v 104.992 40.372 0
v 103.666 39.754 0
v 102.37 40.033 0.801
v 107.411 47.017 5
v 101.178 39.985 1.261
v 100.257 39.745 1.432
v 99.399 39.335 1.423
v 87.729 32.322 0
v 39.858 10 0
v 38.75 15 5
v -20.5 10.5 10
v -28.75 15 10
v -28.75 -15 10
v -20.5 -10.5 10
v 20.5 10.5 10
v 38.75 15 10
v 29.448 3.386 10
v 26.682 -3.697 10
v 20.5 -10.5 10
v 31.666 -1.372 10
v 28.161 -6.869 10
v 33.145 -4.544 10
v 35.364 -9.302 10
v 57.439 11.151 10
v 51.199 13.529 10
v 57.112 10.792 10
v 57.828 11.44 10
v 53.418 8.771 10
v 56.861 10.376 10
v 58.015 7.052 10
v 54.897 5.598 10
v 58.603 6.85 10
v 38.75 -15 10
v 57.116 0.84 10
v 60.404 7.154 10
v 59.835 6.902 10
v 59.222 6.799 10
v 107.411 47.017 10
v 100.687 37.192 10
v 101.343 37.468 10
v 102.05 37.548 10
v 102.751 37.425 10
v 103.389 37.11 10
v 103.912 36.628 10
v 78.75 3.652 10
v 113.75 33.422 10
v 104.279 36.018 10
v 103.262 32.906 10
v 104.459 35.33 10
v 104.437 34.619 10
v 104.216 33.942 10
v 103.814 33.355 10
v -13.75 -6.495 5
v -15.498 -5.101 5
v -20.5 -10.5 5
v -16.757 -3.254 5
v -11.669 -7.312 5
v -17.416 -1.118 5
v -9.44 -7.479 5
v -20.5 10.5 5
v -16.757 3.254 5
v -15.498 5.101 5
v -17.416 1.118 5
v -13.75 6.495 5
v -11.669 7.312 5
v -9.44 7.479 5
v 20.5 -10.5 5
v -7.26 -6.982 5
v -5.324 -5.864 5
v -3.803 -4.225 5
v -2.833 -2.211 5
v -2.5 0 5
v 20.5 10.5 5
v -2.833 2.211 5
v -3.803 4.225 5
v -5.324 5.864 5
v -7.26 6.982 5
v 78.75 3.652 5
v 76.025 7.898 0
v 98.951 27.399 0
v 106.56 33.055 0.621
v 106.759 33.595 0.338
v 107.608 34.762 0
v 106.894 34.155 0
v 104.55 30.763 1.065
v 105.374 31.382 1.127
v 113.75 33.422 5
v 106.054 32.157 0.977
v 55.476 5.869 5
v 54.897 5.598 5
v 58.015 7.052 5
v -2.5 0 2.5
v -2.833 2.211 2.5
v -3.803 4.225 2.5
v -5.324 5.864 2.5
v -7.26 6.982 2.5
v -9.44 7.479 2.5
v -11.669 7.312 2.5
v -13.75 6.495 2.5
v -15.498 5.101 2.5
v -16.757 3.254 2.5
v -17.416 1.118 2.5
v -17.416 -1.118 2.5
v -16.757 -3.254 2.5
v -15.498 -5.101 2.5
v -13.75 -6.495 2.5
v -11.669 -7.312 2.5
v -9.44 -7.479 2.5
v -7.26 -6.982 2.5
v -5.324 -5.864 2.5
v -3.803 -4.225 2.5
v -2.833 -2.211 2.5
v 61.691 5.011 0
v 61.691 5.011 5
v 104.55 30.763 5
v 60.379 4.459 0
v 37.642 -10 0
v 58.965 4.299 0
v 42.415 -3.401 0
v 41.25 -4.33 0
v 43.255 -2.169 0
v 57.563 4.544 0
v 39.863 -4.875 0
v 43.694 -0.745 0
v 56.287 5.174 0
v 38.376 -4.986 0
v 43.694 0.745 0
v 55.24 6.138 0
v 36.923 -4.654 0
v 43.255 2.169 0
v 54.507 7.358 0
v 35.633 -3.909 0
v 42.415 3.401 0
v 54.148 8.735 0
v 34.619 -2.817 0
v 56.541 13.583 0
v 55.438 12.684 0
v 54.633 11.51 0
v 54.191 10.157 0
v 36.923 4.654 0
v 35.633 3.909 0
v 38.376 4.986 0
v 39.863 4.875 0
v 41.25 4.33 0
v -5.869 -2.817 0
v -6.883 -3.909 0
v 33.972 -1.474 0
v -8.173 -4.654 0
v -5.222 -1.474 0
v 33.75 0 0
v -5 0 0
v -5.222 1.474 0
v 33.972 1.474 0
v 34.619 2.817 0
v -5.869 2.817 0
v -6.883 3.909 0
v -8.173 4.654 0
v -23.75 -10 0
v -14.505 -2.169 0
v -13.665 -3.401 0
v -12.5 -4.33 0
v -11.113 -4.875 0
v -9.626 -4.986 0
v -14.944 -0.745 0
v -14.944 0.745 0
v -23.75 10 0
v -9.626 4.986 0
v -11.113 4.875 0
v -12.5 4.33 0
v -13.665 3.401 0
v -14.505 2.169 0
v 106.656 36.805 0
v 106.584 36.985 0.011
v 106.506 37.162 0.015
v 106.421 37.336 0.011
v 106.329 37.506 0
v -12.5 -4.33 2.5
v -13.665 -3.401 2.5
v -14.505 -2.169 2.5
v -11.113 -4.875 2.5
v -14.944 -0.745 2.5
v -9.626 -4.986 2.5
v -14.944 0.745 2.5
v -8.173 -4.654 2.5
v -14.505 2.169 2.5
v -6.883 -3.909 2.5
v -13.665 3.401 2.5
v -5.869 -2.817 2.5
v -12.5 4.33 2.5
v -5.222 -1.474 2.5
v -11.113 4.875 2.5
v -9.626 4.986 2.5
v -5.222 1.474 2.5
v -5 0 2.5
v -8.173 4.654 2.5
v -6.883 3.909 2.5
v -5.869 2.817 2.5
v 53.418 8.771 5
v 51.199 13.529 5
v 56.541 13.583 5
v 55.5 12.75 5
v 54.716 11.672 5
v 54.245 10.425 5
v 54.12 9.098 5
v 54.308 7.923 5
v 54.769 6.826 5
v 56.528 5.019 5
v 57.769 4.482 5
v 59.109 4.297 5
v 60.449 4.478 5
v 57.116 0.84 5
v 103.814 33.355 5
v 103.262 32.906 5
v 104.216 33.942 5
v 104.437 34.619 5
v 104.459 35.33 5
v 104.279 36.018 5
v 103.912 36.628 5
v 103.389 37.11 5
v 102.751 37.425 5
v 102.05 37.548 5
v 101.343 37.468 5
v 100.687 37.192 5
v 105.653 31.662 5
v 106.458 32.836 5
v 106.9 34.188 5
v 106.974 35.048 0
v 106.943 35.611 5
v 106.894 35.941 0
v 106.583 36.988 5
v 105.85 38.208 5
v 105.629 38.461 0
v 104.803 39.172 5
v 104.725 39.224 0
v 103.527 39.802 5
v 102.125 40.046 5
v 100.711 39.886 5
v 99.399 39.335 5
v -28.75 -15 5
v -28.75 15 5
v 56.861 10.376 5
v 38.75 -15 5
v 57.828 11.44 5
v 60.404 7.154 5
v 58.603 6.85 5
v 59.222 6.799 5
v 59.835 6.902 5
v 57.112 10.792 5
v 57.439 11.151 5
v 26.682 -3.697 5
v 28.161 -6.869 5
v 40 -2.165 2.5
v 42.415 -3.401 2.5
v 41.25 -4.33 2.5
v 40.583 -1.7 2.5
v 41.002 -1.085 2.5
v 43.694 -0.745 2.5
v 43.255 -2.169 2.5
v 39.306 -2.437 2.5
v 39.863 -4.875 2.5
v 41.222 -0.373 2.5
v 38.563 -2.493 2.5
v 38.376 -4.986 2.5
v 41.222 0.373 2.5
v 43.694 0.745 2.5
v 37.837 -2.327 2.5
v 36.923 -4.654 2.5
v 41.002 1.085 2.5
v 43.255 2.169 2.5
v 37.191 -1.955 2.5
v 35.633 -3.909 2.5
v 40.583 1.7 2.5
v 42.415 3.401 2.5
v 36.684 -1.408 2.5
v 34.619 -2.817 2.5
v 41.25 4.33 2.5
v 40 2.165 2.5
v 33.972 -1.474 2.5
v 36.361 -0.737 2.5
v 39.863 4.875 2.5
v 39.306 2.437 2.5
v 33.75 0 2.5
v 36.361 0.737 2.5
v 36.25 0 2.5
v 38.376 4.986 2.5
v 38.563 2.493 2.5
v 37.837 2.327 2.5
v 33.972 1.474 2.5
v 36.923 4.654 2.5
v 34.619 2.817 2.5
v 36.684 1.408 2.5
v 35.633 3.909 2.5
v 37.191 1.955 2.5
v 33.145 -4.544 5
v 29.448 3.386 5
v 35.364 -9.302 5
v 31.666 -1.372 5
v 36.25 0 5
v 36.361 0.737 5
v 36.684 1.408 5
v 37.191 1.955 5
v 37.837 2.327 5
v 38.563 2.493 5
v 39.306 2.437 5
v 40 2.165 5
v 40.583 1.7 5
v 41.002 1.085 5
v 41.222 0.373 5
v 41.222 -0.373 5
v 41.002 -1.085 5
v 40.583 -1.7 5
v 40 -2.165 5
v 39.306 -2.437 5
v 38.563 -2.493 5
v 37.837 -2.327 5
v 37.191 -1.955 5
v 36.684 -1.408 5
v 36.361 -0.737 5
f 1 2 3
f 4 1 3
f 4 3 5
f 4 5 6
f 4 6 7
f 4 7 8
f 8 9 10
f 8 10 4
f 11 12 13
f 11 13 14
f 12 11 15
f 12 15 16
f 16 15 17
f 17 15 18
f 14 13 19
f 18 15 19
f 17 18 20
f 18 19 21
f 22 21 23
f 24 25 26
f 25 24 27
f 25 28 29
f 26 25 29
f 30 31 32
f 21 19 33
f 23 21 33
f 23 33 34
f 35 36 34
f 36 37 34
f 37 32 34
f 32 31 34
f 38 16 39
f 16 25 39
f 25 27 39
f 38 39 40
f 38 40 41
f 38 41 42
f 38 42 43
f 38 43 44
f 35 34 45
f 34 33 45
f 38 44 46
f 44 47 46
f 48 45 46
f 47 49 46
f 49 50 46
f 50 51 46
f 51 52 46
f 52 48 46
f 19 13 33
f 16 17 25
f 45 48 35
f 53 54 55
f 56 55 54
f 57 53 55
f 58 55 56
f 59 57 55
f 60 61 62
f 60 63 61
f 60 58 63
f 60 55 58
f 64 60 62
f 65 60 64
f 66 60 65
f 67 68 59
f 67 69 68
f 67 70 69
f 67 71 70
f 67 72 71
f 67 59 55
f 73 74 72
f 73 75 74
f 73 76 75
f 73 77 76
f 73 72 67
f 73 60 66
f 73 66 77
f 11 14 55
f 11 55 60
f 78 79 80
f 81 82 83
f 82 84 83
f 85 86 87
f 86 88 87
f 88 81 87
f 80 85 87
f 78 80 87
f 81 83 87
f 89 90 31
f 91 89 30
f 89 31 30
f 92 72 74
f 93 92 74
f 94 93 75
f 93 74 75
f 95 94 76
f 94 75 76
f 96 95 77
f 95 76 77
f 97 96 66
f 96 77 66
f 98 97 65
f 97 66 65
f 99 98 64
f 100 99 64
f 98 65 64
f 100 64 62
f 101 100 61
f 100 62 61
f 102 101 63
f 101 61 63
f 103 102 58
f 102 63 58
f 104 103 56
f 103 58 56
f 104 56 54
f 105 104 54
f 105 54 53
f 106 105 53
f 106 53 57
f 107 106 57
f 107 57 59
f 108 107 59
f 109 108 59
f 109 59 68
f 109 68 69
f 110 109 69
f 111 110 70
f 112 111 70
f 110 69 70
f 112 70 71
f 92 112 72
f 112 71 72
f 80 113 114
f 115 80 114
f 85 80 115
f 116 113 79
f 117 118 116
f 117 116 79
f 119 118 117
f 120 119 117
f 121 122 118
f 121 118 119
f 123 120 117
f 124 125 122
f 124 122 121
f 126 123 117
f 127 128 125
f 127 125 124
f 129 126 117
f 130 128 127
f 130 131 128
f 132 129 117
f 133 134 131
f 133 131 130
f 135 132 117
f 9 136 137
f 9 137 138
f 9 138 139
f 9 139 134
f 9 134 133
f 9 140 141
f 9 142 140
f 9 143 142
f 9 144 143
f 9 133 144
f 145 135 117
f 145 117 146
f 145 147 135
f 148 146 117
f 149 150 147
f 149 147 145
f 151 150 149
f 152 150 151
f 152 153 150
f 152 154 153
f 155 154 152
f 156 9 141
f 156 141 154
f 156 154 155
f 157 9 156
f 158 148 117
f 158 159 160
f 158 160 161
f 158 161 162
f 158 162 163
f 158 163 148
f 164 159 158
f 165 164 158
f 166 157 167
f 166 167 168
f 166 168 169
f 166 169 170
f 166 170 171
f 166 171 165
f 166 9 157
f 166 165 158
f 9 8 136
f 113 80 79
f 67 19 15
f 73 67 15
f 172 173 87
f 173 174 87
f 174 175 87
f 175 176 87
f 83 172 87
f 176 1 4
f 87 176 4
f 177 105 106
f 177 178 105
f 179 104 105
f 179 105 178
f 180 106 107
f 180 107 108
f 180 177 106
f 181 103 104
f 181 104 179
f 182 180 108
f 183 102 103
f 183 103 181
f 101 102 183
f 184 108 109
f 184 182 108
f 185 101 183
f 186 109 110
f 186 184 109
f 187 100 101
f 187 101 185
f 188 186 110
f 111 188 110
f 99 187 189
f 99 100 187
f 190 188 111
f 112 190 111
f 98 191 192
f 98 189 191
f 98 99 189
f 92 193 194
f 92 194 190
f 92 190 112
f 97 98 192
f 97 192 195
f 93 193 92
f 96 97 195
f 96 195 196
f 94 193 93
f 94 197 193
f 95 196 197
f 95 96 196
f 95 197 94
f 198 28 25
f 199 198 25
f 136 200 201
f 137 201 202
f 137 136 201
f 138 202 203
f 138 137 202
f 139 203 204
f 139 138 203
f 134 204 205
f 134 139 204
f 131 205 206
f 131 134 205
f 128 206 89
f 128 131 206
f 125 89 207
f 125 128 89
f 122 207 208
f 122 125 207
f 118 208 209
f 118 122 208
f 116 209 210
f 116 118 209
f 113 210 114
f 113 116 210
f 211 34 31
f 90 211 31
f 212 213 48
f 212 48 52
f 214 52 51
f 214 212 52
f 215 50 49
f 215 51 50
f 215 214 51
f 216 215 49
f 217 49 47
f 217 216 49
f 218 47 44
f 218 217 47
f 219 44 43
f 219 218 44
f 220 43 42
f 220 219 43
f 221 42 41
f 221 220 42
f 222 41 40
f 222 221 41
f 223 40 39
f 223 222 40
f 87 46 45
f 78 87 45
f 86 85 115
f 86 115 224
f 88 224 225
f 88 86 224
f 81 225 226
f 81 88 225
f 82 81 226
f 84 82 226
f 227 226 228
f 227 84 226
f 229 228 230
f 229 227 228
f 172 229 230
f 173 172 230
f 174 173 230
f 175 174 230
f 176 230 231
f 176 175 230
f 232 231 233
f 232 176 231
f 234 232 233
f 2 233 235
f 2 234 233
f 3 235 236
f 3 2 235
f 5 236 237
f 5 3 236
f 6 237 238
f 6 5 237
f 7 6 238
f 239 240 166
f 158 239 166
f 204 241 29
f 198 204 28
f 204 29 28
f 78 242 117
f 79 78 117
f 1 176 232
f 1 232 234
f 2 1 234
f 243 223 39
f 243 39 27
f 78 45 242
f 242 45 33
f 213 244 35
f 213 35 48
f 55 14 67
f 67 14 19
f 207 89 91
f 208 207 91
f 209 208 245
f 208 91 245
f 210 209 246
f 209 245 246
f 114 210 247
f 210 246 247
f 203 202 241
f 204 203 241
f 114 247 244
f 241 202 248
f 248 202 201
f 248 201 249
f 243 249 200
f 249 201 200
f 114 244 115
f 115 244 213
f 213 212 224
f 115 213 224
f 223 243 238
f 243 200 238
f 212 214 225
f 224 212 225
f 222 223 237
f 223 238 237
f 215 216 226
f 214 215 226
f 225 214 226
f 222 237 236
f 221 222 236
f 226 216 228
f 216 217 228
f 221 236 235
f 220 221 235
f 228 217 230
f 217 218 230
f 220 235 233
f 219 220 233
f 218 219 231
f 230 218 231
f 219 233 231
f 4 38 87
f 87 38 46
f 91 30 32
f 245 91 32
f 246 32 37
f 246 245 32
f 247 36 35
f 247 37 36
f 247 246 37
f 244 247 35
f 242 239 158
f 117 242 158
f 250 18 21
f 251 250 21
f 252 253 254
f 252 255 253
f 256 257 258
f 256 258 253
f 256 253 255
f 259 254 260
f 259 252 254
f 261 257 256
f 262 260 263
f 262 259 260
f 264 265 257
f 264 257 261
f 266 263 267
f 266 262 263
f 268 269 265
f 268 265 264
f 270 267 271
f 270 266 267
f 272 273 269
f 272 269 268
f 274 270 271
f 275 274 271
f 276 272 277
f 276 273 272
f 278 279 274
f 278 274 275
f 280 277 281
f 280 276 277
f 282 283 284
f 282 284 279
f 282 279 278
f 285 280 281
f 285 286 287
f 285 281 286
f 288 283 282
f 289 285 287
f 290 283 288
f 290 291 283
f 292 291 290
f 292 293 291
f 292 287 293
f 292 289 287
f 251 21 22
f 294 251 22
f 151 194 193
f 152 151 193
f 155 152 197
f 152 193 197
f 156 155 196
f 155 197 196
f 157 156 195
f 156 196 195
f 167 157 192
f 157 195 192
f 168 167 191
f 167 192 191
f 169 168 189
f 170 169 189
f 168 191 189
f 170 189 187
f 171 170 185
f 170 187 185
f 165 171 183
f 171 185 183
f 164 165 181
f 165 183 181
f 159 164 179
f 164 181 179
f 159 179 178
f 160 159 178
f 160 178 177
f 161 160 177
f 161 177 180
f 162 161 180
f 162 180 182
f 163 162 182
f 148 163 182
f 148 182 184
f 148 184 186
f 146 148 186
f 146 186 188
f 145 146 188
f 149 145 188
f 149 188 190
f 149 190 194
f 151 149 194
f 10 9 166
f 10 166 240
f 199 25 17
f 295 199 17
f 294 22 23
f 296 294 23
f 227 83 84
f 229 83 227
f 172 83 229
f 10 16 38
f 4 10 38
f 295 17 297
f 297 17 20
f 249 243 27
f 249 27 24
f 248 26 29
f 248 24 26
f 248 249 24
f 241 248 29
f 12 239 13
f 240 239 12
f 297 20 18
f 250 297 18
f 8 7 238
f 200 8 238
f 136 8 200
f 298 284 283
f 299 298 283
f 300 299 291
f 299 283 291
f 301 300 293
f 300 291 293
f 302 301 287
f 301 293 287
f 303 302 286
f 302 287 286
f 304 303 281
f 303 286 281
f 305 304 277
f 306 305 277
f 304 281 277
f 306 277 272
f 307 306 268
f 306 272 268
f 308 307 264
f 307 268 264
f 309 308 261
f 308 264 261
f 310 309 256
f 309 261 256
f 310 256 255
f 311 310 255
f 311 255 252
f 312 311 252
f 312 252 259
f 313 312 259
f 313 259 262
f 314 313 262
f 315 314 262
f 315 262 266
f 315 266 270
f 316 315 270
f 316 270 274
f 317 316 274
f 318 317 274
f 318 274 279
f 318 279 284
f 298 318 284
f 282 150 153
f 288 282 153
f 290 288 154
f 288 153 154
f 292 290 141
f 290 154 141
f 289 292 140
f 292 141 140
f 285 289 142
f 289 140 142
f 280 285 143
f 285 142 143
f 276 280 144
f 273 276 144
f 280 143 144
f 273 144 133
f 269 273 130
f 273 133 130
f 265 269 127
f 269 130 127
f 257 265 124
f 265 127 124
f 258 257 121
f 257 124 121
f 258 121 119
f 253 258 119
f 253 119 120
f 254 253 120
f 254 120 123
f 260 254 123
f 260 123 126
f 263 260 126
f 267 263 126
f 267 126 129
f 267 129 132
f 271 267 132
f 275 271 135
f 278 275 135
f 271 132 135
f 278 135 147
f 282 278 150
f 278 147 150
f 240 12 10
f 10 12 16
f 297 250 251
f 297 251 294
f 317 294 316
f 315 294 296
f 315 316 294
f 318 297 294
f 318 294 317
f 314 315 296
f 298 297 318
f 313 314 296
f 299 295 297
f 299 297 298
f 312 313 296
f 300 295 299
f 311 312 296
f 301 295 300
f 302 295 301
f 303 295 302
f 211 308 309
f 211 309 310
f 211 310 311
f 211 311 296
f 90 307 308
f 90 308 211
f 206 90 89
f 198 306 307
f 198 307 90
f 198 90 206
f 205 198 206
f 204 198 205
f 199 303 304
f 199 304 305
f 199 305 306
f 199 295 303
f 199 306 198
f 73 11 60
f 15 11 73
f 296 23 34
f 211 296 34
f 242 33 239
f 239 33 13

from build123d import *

# Parameters (mm, degrees)
SKETCH1_W                = 57.5
SKETCH1_H                = 30
BOSS_EXTRUDE1_DEPTH      = 30
SKETCH2_W                = 41
SKETCH2_H                = 21
CUT_EXTRUDE1_DEPTH       = 25
SKETCH8_R                = 2
CUT_EXTRUDE6_DEPTH       = 10
SKETCH10_R               = 5
CUT_EXTRUDE8_DEPTH       = 10
BOSS_EXTRUDE4_DEPTH      = 30
SKETCH16_R               = 5
CUT_EXTRUDE10_DEPTH      = 30
CHAMFER5_SIZE            = 5
SKETCH20_R               = 7.5
CUT_EXTRUDE13_DEPTH      = 2.5
CUT_EXTRUDE16_DEPTH      = 122.918629513
CUT_EXTRUDE16_DEPTH_BACK = 122.918629513
SKETCH30_W               = 142.5
SKETCH30_H               = 20
CUT_EXTRUDE17_DEPTH      = 5
CUT_EXTRUDE19_DEPTH      = 124.489525441
CUT_EXTRUDE20_DEPTH      = 5
SKETCH35_R               = 2.5
CUT_EXTRUDE21_DEPTH      = 5
SKETCH36_R               = 5
CUT_EXTRUDE22_DEPTH      = 2.5


with BuildPart() as part:
    # Sketch1 → Boss-Extrude1 (new body)
    with BuildSketch(Plane.XY):
        Rectangle(SKETCH1_W, SKETCH1_H)
    extrude(amount=BOSS_EXTRUDE1_DEPTH)

    # Sketch2 → Cut-Extrude1 (cut)
    with BuildSketch(Plane.XY.offset(30)):
        Rectangle(SKETCH2_W, SKETCH2_H)
    extrude(amount=-CUT_EXTRUDE1_DEPTH, mode=Mode.SUBTRACT)

    # Sketch8 → Cut-Extrude6 (cut)
    with BuildSketch(Plane.XY.offset(30)):
        with Locations((24.35, 6)):
            Circle(SKETCH8_R)
        with Locations(Location((24.35, -6, 0), (0, 0, 180))):
            Circle(SKETCH8_R)
        with Locations((-24.35, -6)):
            Circle(SKETCH8_R)
        with Locations(Location((-24.35, 6, 0), (0, 0, 180))):
            Circle(SKETCH8_R)
    extrude(amount=-CUT_EXTRUDE6_DEPTH, mode=Mode.SUBTRACT)

    # Sketch10 → Cut-Extrude8 (cut)
    with BuildSketch(Plane.XY.offset(5)):
        with Locations((-10, 0)):
            Circle(SKETCH10_R)
    extrude(amount=-CUT_EXTRUDE8_DEPTH, mode=Mode.SUBTRACT)

    # Sketch13 → Boss-Extrude4 (add)
    with BuildSketch(Plane.XY.offset(30)):
        Polygon((28.75, 15), (38.75, 15), (107.410726074, 47.017022383), (113.75, 33.422405577), (78.75, 3.652306326), (38.75, -15), (28.75, -15), align=None)
    extrude(amount=-BOSS_EXTRUDE4_DEPTH)

    # Sketch16 → Cut-Extrude10 (cut)
    with BuildSketch(Plane(origin=(1.175656739, -2.521204013, 0), x_dir=(0.9063077870366488, 0.42261826174070183, 0), z_dir=(-0.42261826174070183, 0.9063077870366488, 0))):
        with Locations(Location((97.217429724, -15, 0), (0, 0, 180))):
            Circle(SKETCH16_R)
        with BuildLine():
            Line((67.217429724, -12.5), (82.217429724, -12.5))
            ThreePointArc((82.217429724, -12.5), (84.717429724, -15), (82.217429724, -17.5))
            Line((82.217429724, -17.5), (67.217429724, -17.5))
            ThreePointArc((67.217429724, -17.5), (64.717429724, -15), (67.217429724, -12.5))
        make_face()
    extrude(amount=-CUT_EXTRUDE10_DEPTH, mode=Mode.SUBTRACT)

    # Chamfer5
    # the kernel refuses this chamfer: 5 mm, written as the material it takes off along each edge
    with BuildSketch(Plane(origin=(-28.75, 27.85841494, 0), x_dir=(-0.027495876610586317, 0, 0.9996219169112968), z_dir=(0, -1, 0))) as chamfer5_piece_1:
        Polygon((CHAMFER5_SIZE * 0.999621916911, -CHAMFER5_SIZE * 0.0274958766106), (-CHAMFER5_SIZE * 0.0274958766106, -CHAMFER5_SIZE * 0.999621916911), (0, 0), align=None)
    extrude(amount=55.71682988, mode=Mode.SUBTRACT)
    with BuildSketch(Plane(origin=(-41.60841494, -15, 0), x_dir=(0, -0.027495876610586317, 0.9996219169112968), z_dir=(1, 0, 0)), Plane(origin=(51.60841494, -15, 30), x_dir=(0, -0.027495876610586317, -0.9996219169112968), z_dir=(-1, 0, 0))) as chamfer5_piece_2:
        Polygon((CHAMFER5_SIZE * 0.999621916911, -CHAMFER5_SIZE * 0.0274958766106), (-CHAMFER5_SIZE * 0.0274958766106, -CHAMFER5_SIZE * 0.999621916911), (0, 0), align=None)
    extrude(amount=93.21682988, mode=Mode.SUBTRACT)
    with BuildSketch(Plane(origin=(90.403681589, 9.086507297, 30), x_dir=(-0.4224584769229526, 0.905965127389214, 0.02749587661058631), z_dir=(-0.9063077870366526, -0.4226182617406939, 0)), Plane(origin=(90.403681589, 9.086507297, 0), x_dir=(0.011620259578202724, -0.024919727083573626, 0.9996219169112968), z_dir=(-0.9063077870366526, -0.4226182617406939, 0))) as chamfer5_piece_3:
        Polygon((CHAMFER5_SIZE * 0.999621916911, CHAMFER5_SIZE * 0.0274958766106), (-CHAMFER5_SIZE * 0.0274958766106, CHAMFER5_SIZE * 0.999621916911), (0, 0), align=None)
    extrude(amount=69.851946638, mode=Mode.SUBTRACT)
    with BuildSketch(Plane(origin=(123.544555766, 41.753402643, 0), x_dir=(-0.6476573741944397, 0.7614354223576539, -0.027495876610586414), z_dir=(-0.7617234170999287, -0.6479023351104763, 0))) as chamfer5_piece_4:
        Polygon((CHAMFER5_SIZE * 0.999621916911, -CHAMFER5_SIZE * 0.0274958766106), (-CHAMFER5_SIZE * 0.0274958766106, -CHAMFER5_SIZE * 0.999621916911), (0, 0), align=None)
    extrude(amount=71.665266299, mode=Mode.SUBTRACT)
    with BuildSketch(Plane(origin=(123.544555766, 41.753402643, 30), x_dir=(-0.6476573741944397, 0.7614354223576539, 0.02749587661058634), z_dir=(-0.7617234170999287, -0.6479023351104763, 0))) as chamfer5_piece_5:
        Polygon((CHAMFER5_SIZE * 0.999621916911, CHAMFER5_SIZE * 0.0274958766106), (-CHAMFER5_SIZE * 0.0274958766106, CHAMFER5_SIZE * 0.999621916911), (0, 0), align=None)
    extrude(amount=71.665266299, mode=Mode.SUBTRACT)
    with BuildSketch(Plane(origin=(101.976525103, 58.670703972, 30), x_dir=(-0.9059651273892108, -0.42245847692295924, 0.027495876610586337), z_dir=(0.42261826174070055, -0.9063077870366495, 0))) as chamfer5_piece_6:
        Polygon((CHAMFER5_SIZE * 0.999621916911, CHAMFER5_SIZE * 0.0274958766106), (-CHAMFER5_SIZE * 0.0274958766106, CHAMFER5_SIZE * 0.999621916911), (0, 0), align=None)
    extrude(amount=40.71682988, mode=Mode.SUBTRACT)
    with BuildSketch(Plane(origin=(101.976525103, 58.670703972, 0), x_dir=(-0.9059651273892108, -0.42245847692295924, -0.027495876610586344), z_dir=(0.42261826174070055, -0.9063077870366495, 0))) as chamfer5_piece_7:
        Polygon((CHAMFER5_SIZE * 0.999621916911, -CHAMFER5_SIZE * 0.0274958766106), (-CHAMFER5_SIZE * 0.0274958766106, -CHAMFER5_SIZE * 0.999621916911), (0, 0), align=None)
    extrude(amount=40.71682988, mode=Mode.SUBTRACT)
    with BuildSketch(Plane(origin=(27.096318411, 9.565799029, 30), x_dir=(0.4224584769229604, -0.9059651273892103, 0.027495876610586313), z_dir=(0.9063077870366489, 0.4226182617407018, 0))) as chamfer5_piece_8_section:
        Polygon((CHAMFER5_SIZE * 0.999621916911, CHAMFER5_SIZE * 0.0274958766106), (-CHAMFER5_SIZE * 0.0274958766106, CHAMFER5_SIZE * 0.999621916911), (0, 0), align=None)
    chamfer5_piece_8 = extrude(amount=101.47555893, mode=Mode.PRIVATE)
    chamfer5_piece_8 = split(chamfer5_piece_8, bisect_by=Plane(origin=(81.150743587, 15, 28.329639499), z_dir=(0, 1, 0)), keep=Keep.TOP, mode=Mode.PRIVATE)
    add(chamfer5_piece_8, mode=Mode.SUBTRACT)
    with BuildSketch(Plane(origin=(27.096318411, 9.565799029, 0), x_dir=(0.4224584769229604, -0.9059651273892103, -0.02749587661058636), z_dir=(0.9063077870366489, 0.4226182617407018, 0))) as chamfer5_piece_9_section:
        Polygon((CHAMFER5_SIZE * 0.999621916911, -CHAMFER5_SIZE * 0.0274958766106), (-CHAMFER5_SIZE * 0.0274958766106, -CHAMFER5_SIZE * 0.999621916911), (0, 0), align=None)
    chamfer5_piece_9 = extrude(amount=101.47555893, mode=Mode.PRIVATE)
    chamfer5_piece_9 = split(chamfer5_piece_9, bisect_by=Plane(origin=(81.150743587, 15, 1.670360501), z_dir=(0, 1, 0)), keep=Keep.TOP, mode=Mode.PRIVATE)
    add(chamfer5_piece_9, mode=Mode.SUBTRACT)
    with BuildSketch(Plane(origin=(-41.60841494, 15, 0), x_dir=(0, -0.9996219169112968, -0.027495876610586372), z_dir=(1, 0, 0))) as chamfer5_piece_10_section:
        Polygon((CHAMFER5_SIZE * 0.999621916911, -CHAMFER5_SIZE * 0.0274958766106), (-CHAMFER5_SIZE * 0.0274958766106, -CHAMFER5_SIZE * 0.999621916911), (0, 0), align=None)
    chamfer5_piece_10 = extrude(amount=93.21682988, mode=Mode.PRIVATE)
    chamfer5_piece_10 = split(chamfer5_piece_10, bisect_by=Plane(origin=(3.719146846, -1.335155097, 1.672660276), z_dir=(-0.4226182617407018, 0.9063077870366489, 0)), keep=Keep.TOP, mode=Mode.PRIVATE)
    add(chamfer5_piece_10, mode=Mode.SUBTRACT)
    with BuildSketch(Plane(origin=(51.60841494, 15, 30), x_dir=(0, -0.9996219169112968, 0.027495876610586317), z_dir=(-1, 0, 0))) as chamfer5_piece_11_section:
        Polygon((CHAMFER5_SIZE * 0.999621916911, -CHAMFER5_SIZE * 0.0274958766106), (-CHAMFER5_SIZE * 0.0274958766106, -CHAMFER5_SIZE * 0.999621916911), (0, 0), align=None)
    chamfer5_piece_11 = extrude(amount=93.21682988, mode=Mode.PRIVATE)
    chamfer5_piece_11 = split(chamfer5_piece_11, bisect_by=Plane(origin=(3.719146846, -1.335155097, 28.327339724), z_dir=(-0.4226182617407018, 0.9063077870366489, 0)), keep=Keep.TOP, mode=Mode.PRIVATE)
    add(chamfer5_piece_11, mode=Mode.SUBTRACT)
    with BuildSketch(Plane(origin=(27.096318411, 9.565799029, 30), x_dir=(0.4224584769229604, -0.9059651273892103, 0.027495876610586313), z_dir=(0.9063077870366489, 0.4226182617407018, 0))) as chamfer5_piece_12a_section:
        Polygon((CHAMFER5_SIZE * 0.999621916911, CHAMFER5_SIZE * 0.0274958766106), (-CHAMFER5_SIZE * 0.0274958766106, CHAMFER5_SIZE * 0.999621916911), (0, 0), align=None)
    chamfer5_piece_12a = extrude(amount=101.47555893, mode=Mode.PRIVATE)
    chamfer5_piece_12a = split(chamfer5_piece_12a, bisect_by=Plane(origin=(35.512062488, 15, 28.462048788), z_dir=(0, -1, 0)), keep=Keep.TOP, mode=Mode.PRIVATE)
    with BuildSketch(Plane(origin=(51.60841494, 15, 30), x_dir=(0, -0.9996219169112968, 0.027495876610586317), z_dir=(-1, 0, 0))) as chamfer5_piece_12b_section:
        Polygon((CHAMFER5_SIZE * 0.999621916911, -CHAMFER5_SIZE * 0.0274958766106), (-CHAMFER5_SIZE * 0.0274958766106, -CHAMFER5_SIZE * 0.999621916911), (0, 0), align=None)
    chamfer5_piece_12b = extrude(amount=93.21682988, mode=Mode.PRIVATE)
    chamfer5_piece_12b = split(chamfer5_piece_12b, bisect_by=Plane(origin=(41.684567981, 16.368411523, 28.462048788), z_dir=(0.4226182617407018, -0.9063077870366489, 0)), keep=Keep.TOP, mode=Mode.PRIVATE)
    chamfer5_piece_12 = chamfer5_piece_12a & chamfer5_piece_12b
    add(chamfer5_piece_12, mode=Mode.SUBTRACT)
    with BuildSketch(Plane(origin=(27.096318411, 9.565799029, 0), x_dir=(0.4224584769229604, -0.9059651273892103, -0.02749587661058636), z_dir=(0.9063077870366489, 0.4226182617407018, 0))) as chamfer5_piece_13a_section:
        Polygon((CHAMFER5_SIZE * 0.999621916911, -CHAMFER5_SIZE * 0.0274958766106), (-CHAMFER5_SIZE * 0.0274958766106, -CHAMFER5_SIZE * 0.999621916911), (0, 0), align=None)
    chamfer5_piece_13a = extrude(amount=101.47555893, mode=Mode.PRIVATE)
    chamfer5_piece_13a = split(chamfer5_piece_13a, bisect_by=Plane(origin=(35.512062488, 15, 1.537951212), z_dir=(0, -1, 0)), keep=Keep.TOP, mode=Mode.PRIVATE)
    with BuildSketch(Plane(origin=(-41.60841494, 15, 0), x_dir=(0, -0.9996219169112968, -0.027495876610586372), z_dir=(1, 0, 0))) as chamfer5_piece_13b_section:
        Polygon((CHAMFER5_SIZE * 0.999621916911, -CHAMFER5_SIZE * 0.0274958766106), (-CHAMFER5_SIZE * 0.0274958766106, -CHAMFER5_SIZE * 0.999621916911), (0, 0), align=None)
    chamfer5_piece_13b = extrude(amount=93.21682988, mode=Mode.PRIVATE)
    chamfer5_piece_13b = split(chamfer5_piece_13b, bisect_by=Plane(origin=(41.684567981, 16.368411523, 1.537951212), z_dir=(0.4226182617407018, -0.9063077870366489, 0)), keep=Keep.TOP, mode=Mode.PRIVATE)
    chamfer5_piece_13 = chamfer5_piece_13a & chamfer5_piece_13b
    add(chamfer5_piece_13, mode=Mode.SUBTRACT)

    # Sketch20 → Cut-Extrude13 (cut)
    with BuildSketch(Plane.XY.offset(5)):
        with Locations((-10, 0)):
            Circle(SKETCH20_R)
    extrude(amount=-CUT_EXTRUDE13_DEPTH, mode=Mode.SUBTRACT)

    # Sketch30 → Cut-Extrude16 (cut, two sides: drawn at the far end of the back side and taken through both)
    with BuildSketch(Plane(origin=(0, 15, 0), x_dir=(1, 0, 0), z_dir=(0, 1, 0)).offset(-CUT_EXTRUDE16_DEPTH_BACK)):
        with Locations((42.5, -20)):
            Rectangle(SKETCH30_W, SKETCH30_H)
    extrude(amount=CUT_EXTRUDE16_DEPTH + CUT_EXTRUDE16_DEPTH_BACK, mode=Mode.SUBTRACT)

    # Sketch31 → Cut-Extrude17 (cut)
    with BuildSketch(Plane.XY.offset(10)):
        Polygon((29.447517659, 3.385826677), (31.666263533, -1.372289205), (53.417650422, 8.770549077), (51.198904547, 13.528664959), align=None)
        Polygon((54.896814338, 5.598471822), (33.145427449, -4.544366459), (35.364173323, -9.302482341), (57.115560212, 0.84035594), align=None)
        Polygon((26.681570704, -3.696689644), (28.16073462, -6.868766899), (33.145427449, -4.544366459), (31.666263533, -1.372289205), align=None)
        Polygon((31.666263533, -1.372289205), (33.145427449, -4.544366459), (54.896814338, 5.598471822), (53.417650422, 8.770549077), align=None)
        Polygon((53.417650422, 8.770549077), (54.896814338, 5.598471822), (59.881507166, 7.922872262), (58.40234325, 11.094949516), align=None)
    extrude(amount=-CUT_EXTRUDE17_DEPTH, mode=Mode.SUBTRACT)

    # Sketch33 → Cut-Extrude19 (cut, through all)
    with BuildSketch(Plane.XY):
        with BuildLine():
            Line((60.40363349, 7.153909711), (103.261998525, 32.905813456))
            ThreePointArc((103.261998525, 32.905813456), (104.11732159, 36.336326895), (100.686808151, 37.19164996))
            Line((100.686808151, 37.19164996), (57.828443116, 11.439746214))
            ThreePointArc((57.828443116, 11.439746214), (56.973120051, 8.009232775), (60.40363349, 7.153909711))
        make_face()
    extrude(amount=CUT_EXTRUDE19_DEPTH, mode=Mode.SUBTRACT)

    # Sketch34 → Cut-Extrude20 (cut)
    with BuildSketch(Plane(origin=(0, 0, 0), x_dir=(-1, 0, 0), z_dir=(0, 0, -1))):
        with BuildLine():
            Line((-99.399212963, 39.334568211), (-56.540847928, 13.582664466))
            ThreePointArc((-56.540847928, 13.582664466), (-54.830201799, 6.721637588), (-61.691228677, 5.010991459))
            Line((-61.691228677, 5.010991459), (-104.549593712, 30.762895204))
            ThreePointArc((-104.549593712, 30.762895204), (-106.260239841, 37.623922082), (-99.399212963, 39.334568211))
        make_face()
    extrude(amount=-CUT_EXTRUDE20_DEPTH, mode=Mode.SUBTRACT)

    # Sketch35 → Cut-Extrude21 (cut)
    with BuildSketch(Plane(origin=(0, 0, 0), x_dir=(-1, 0, 0), z_dir=(0, 0, -1))):
        with Locations((-38.75, 0)):
            Circle(SKETCH35_R)
    extrude(amount=-CUT_EXTRUDE21_DEPTH, mode=Mode.SUBTRACT)

    # Sketch36 → Cut-Extrude22 (cut)
    with BuildSketch(Plane(origin=(0, 0, 0), x_dir=(-1, 0, 0), z_dir=(0, 0, -1))):
        with Locations((-38.75, 0)):
            Circle(SKETCH36_R)
    extrude(amount=-CUT_EXTRUDE22_DEPTH, mode=Mode.SUBTRACT)


solid = part.part
